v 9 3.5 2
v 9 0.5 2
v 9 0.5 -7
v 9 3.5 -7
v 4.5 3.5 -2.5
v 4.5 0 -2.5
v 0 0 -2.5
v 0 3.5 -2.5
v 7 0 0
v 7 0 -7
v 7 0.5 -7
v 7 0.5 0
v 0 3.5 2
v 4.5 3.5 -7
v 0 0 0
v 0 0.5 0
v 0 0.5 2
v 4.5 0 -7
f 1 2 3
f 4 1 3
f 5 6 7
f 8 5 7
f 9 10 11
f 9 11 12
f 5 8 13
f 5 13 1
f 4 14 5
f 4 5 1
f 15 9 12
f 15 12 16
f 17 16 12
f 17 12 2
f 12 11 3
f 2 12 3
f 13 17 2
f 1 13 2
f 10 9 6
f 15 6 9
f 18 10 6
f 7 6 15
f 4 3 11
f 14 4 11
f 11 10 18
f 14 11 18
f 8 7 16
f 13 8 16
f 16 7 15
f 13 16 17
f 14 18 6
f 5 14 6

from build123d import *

# Parameters (mm, degrees)
SALIENTE_EXTRUIR1_DEPTH = 0.5
SALIENTE_EXTRUIR2_DEPTH = 3


with BuildPart() as part:
    # Croquis1 → Saliente-Extruir1 (new body)
    with BuildSketch(Plane(origin=(0, 0, 0), x_dir=(1, 0, 0), z_dir=(0, 1, 0))):
        Polygon((0, 0), (0, 2.5), (4.5, 2.5), (4.5, 7), (7, 7), (7, 0), align=None)
    extrude(amount=SALIENTE_EXTRUIR1_DEPTH)

    # Croquis2 → Saliente-Extruir2 (add)
    with BuildSketch(Plane(origin=(0, 0.5, 0), x_dir=(1, 0, 0), z_dir=(0, 1, 0))):
        Polygon((0, 2.5), (0, 0), (0, -2), (9, -2), (9, 7), (7, 7), (4.5, 7), (4.5, 2.5), align=None)
    extrude(amount=SALIENTE_EXTRUIR2_DEPTH)


solid = part.part
